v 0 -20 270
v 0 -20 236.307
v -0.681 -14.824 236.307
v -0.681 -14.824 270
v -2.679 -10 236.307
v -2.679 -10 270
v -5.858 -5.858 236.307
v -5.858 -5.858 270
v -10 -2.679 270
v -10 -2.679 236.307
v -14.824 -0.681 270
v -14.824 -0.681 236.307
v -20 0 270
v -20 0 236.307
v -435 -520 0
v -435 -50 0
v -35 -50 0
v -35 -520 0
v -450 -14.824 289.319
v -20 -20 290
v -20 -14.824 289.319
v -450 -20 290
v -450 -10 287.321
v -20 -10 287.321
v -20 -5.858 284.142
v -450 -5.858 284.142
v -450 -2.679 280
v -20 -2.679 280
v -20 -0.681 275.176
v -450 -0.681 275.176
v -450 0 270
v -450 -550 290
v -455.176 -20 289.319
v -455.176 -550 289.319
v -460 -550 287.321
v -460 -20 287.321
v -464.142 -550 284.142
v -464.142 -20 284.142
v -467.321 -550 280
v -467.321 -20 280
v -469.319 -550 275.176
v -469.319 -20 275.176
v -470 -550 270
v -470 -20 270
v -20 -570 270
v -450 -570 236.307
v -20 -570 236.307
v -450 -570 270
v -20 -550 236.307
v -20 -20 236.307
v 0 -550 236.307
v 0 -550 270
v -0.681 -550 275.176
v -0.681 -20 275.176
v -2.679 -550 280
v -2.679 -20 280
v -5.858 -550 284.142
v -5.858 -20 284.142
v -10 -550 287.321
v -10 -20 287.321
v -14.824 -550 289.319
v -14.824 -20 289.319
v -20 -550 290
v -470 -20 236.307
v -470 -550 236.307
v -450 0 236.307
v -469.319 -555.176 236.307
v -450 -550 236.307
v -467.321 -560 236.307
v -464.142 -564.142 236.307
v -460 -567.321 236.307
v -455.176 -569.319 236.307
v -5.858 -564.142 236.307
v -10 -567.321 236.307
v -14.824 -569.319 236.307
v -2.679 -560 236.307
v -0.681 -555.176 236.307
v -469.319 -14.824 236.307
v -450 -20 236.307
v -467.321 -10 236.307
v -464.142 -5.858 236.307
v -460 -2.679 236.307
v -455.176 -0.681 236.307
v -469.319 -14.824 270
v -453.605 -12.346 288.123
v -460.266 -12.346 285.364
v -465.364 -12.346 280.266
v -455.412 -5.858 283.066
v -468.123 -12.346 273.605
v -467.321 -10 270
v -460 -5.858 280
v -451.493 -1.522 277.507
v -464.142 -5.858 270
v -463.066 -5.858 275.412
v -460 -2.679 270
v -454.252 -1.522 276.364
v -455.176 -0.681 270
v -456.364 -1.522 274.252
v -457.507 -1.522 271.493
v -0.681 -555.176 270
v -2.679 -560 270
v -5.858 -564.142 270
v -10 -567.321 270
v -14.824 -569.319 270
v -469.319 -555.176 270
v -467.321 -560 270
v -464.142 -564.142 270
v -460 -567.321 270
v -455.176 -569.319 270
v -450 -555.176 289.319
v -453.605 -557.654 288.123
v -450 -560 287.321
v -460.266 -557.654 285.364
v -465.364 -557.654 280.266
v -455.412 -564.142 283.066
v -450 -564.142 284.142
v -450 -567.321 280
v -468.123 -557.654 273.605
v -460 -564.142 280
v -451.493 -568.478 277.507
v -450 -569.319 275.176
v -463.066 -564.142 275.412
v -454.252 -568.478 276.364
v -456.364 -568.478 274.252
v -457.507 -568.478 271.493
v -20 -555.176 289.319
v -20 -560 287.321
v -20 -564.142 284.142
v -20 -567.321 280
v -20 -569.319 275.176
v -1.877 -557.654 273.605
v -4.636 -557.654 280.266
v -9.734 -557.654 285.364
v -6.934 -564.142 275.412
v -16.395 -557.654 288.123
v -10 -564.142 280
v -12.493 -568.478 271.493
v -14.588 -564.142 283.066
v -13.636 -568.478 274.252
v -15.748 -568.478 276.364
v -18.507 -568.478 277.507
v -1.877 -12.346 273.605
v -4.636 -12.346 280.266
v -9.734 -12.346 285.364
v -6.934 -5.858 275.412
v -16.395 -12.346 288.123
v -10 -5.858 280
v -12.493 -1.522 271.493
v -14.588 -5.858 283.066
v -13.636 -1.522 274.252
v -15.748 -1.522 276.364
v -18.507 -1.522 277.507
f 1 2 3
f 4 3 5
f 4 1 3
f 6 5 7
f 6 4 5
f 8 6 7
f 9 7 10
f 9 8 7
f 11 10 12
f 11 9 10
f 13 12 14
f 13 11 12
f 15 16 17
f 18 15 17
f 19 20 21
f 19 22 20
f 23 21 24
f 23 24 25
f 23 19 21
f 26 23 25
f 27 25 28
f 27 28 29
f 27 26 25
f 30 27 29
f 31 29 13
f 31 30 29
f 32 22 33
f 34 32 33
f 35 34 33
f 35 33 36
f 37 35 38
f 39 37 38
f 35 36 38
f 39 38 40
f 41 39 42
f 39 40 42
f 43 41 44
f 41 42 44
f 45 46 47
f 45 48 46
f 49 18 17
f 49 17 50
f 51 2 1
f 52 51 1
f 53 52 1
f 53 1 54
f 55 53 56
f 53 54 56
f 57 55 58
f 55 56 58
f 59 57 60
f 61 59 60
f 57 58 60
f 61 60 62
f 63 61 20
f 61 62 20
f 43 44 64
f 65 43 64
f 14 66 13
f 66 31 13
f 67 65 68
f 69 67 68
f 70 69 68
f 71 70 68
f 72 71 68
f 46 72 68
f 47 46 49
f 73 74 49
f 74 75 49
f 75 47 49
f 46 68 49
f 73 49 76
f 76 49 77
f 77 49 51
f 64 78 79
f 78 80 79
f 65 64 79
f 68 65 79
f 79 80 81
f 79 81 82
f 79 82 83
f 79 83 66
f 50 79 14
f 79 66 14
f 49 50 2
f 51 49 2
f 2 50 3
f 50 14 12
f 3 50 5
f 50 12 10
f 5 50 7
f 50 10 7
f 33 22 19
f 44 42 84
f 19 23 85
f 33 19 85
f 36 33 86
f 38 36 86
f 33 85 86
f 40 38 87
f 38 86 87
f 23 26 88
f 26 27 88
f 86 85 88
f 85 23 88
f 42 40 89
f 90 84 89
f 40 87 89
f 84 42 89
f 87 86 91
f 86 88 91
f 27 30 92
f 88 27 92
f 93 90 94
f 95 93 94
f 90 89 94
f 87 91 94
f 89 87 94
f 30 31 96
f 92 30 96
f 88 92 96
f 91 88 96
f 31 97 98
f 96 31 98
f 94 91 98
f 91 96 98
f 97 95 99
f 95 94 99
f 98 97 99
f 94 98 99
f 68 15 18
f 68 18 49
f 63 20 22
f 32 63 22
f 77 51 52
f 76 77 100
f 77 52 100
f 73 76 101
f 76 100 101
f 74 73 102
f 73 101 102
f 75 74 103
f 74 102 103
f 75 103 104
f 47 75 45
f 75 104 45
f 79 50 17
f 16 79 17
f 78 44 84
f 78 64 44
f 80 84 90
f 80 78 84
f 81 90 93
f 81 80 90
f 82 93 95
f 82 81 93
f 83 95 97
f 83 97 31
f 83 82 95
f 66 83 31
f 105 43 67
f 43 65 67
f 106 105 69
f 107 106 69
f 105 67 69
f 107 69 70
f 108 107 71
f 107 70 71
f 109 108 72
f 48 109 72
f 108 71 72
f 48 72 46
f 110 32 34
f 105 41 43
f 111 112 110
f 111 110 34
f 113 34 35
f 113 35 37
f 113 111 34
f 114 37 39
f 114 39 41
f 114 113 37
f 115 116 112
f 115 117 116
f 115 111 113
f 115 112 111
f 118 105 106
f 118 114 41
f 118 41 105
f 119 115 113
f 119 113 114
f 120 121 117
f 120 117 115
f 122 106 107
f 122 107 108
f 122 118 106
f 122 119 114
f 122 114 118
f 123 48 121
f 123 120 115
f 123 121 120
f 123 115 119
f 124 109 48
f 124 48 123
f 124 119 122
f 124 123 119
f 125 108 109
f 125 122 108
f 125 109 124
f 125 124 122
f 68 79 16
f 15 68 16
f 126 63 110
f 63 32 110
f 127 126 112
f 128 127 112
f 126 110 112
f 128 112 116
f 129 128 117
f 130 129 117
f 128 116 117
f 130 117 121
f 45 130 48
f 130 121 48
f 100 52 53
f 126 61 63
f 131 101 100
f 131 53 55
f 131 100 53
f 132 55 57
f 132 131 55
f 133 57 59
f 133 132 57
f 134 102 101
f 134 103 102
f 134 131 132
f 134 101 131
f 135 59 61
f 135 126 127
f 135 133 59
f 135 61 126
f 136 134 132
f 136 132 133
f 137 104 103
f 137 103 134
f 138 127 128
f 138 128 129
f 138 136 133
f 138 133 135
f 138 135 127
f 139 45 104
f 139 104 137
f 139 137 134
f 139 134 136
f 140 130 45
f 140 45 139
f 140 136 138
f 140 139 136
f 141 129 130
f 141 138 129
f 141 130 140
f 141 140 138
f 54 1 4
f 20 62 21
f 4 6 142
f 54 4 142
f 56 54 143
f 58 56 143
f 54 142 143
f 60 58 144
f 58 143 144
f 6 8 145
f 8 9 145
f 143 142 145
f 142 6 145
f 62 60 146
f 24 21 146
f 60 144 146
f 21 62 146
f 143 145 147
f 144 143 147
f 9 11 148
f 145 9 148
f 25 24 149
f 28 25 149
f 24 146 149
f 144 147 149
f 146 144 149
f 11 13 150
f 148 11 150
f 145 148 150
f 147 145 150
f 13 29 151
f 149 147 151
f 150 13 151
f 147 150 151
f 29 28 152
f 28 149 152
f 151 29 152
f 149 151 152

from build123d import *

# Parameters (mm, degrees)
F1_DEPTH = 570
F3_DEPTH = 470.001
F4_R     = 20


with BuildPart() as f1:
    # F0 (on Front) → F1 (new body)
    with BuildSketch(Plane.XZ):
        with BuildLine():
            Line((-235, 0), (-35, 0))
            Line((-35, 0), (-20, 236.3072186708))
            Line((-20, 236.3072186708), (0, 236.3072186708))
            Line((0, 236.3072186708), (0, 270))
            ThreePointArc((0, 270), (-5.8578643763, 284.1421356237), (-20, 290))
            Line((-20, 290), (-235, 290))
            Line((-235, 290), (-235, 0))
        make_face()
        with BuildLine():
            Line((-435, 0), (-235, 0))
            Line((-235, 0), (-235, 290))
            Line((-235, 290), (-450, 290))
            ThreePointArc((-450, 290), (-464.1421356237, 284.1421356237), (-470, 270))
            Line((-470, 270), (-470, 236.3072186708))
            Line((-470, 236.3072186708), (-450, 236.3072186708))
            Line((-450, 236.3072186708), (-435, 0))
        make_face()
    extrude(amount=F1_DEPTH)

    # F2 (on Right) → F3 (cut, through all)
    with BuildSketch(Plane.YZ):
        Polygon((-50, 0), (0, 0), (0, 236.3072186708), (-20, 236.3072186708), align=None)
        Polygon((-570, 0), (-520, 0), (-550, 236.3072186708), (-570, 236.3072186708), align=None)
    extrude(amount=-F3_DEPTH, mode=Mode.SUBTRACT)

    # F4
    f4_edges = [f1.edges().sort_by_distance(p)[0] for p in [
        (-235, -570, 290),
        (-235, 0, 290),
    ]]
    fillet(f4_edges, radius=F4_R)


solid = f1.part
